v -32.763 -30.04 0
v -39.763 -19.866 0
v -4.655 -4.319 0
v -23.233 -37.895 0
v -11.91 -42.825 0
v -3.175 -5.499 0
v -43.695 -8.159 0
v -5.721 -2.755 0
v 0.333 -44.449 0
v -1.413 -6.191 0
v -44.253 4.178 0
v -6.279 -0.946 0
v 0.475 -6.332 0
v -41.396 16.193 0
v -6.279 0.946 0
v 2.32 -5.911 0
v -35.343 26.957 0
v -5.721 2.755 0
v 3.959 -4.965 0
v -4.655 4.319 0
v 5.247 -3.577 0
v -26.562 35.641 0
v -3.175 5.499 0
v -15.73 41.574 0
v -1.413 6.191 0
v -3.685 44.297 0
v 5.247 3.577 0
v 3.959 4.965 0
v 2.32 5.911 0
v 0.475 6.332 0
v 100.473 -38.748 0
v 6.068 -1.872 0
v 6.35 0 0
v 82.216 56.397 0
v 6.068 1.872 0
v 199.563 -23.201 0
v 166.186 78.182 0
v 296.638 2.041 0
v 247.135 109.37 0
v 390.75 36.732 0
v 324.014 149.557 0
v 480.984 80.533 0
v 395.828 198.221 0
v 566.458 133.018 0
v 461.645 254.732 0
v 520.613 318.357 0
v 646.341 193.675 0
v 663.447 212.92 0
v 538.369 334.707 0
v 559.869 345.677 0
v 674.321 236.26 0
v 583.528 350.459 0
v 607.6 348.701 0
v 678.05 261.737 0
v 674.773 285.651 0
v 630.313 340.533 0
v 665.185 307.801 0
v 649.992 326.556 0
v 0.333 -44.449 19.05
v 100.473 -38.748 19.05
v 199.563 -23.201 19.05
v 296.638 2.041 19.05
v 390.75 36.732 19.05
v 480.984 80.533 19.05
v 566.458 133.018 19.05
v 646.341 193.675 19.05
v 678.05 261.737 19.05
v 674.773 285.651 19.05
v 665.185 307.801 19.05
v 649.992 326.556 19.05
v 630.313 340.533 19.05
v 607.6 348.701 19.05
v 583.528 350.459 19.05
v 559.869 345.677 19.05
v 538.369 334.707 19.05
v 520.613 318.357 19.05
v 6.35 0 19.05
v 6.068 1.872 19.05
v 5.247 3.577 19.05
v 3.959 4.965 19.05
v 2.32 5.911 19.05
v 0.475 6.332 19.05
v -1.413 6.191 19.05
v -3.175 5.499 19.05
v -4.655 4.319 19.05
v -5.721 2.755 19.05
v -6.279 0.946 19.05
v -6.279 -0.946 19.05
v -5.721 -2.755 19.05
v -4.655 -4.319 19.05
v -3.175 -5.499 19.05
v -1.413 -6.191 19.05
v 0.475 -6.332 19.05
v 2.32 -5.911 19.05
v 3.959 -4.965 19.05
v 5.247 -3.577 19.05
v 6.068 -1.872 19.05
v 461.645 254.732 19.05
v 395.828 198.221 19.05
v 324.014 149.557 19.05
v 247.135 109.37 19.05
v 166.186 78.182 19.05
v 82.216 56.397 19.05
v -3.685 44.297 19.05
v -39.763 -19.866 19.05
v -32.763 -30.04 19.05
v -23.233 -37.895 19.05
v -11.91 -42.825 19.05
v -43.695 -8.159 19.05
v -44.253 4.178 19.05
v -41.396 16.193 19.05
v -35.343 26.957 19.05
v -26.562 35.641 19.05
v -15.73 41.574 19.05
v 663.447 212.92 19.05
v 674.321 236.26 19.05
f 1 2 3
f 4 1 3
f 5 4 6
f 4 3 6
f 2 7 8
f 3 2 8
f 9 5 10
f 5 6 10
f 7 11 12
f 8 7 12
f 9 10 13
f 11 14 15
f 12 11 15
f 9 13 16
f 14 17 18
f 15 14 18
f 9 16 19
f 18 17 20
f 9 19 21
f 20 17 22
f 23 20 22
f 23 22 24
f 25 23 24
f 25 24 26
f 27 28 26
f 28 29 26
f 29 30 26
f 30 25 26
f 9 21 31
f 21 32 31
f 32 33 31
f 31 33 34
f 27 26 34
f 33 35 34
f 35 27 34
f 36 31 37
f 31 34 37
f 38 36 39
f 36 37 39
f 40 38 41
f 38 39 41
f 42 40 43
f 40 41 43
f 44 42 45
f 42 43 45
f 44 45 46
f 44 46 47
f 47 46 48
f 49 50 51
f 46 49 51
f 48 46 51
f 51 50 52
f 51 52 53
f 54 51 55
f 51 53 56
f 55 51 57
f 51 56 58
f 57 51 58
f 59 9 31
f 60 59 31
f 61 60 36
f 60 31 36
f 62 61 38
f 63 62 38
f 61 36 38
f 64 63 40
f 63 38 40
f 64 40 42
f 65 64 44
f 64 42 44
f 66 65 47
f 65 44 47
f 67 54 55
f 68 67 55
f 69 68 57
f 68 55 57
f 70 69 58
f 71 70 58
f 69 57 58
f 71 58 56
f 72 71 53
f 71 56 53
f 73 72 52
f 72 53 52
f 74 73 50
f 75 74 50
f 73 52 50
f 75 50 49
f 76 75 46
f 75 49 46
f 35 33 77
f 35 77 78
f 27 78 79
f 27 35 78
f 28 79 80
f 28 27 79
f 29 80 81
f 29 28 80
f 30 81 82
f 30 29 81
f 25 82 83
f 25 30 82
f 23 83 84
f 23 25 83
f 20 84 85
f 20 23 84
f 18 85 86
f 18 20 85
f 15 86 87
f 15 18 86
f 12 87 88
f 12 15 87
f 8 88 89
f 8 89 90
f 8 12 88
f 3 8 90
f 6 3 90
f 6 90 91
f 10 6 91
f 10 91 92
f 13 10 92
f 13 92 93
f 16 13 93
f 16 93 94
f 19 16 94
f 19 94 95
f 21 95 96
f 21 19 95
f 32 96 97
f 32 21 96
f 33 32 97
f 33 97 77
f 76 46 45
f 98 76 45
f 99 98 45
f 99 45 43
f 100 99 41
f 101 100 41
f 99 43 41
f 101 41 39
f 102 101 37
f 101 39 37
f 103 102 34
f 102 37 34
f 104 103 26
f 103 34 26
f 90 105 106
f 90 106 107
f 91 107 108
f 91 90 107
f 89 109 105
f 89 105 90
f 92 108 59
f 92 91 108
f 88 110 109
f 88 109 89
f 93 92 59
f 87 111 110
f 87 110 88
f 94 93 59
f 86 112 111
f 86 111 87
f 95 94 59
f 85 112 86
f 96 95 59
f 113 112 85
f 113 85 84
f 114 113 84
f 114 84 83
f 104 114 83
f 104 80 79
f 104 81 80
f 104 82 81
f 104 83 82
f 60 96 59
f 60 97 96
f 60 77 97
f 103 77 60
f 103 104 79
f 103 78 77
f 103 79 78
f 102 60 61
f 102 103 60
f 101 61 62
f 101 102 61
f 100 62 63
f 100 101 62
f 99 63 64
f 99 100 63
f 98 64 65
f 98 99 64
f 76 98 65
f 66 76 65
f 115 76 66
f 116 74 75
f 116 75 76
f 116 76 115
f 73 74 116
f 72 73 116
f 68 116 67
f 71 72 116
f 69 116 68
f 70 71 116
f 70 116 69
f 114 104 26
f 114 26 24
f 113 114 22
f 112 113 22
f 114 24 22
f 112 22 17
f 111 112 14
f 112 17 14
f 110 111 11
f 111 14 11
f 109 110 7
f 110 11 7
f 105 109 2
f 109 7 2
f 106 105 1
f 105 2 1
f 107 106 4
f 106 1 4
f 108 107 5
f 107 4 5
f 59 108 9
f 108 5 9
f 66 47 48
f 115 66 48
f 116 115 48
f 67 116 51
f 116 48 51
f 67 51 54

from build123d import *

# Parameters (mm, degrees)
F0_R     = 6.35
F1_DEPTH = 19.05


with BuildPart() as f1:
    # F0 (on Top) → F1 (new body)
    with BuildSketch(Plane.XY):
        with BuildLine():
            ThreePointArc((0.332687, -44.448755), (31.5483, -31.313053), (44.45, 0))
            ThreePointArc((44.45, 0), (30.100022, 32.707663), (-3.684587, 44.297024))
            ThreePointArc((-3.684587, 44.297024), (-44.404528, -2.010069), (0.332687, -44.448755))
        make_face()
        Circle(F0_R, mode=Mode.SUBTRACT)
        with BuildLine():
            ThreePointArc((678.049984, 261.737104), (619.235303, 345.391653), (520.612783, 318.357437))
            ThreePointArc((520.612783, 318.357437), (526.551405, 198.613195), (646.341094, 193.675463))
            ThreePointArc((646.341094, 193.675463), (669.73379, 224.194326), (678.049984, 261.737104))
        make_face()
        with BuildLine():
            ThreePointArc((-3.684587, 44.297024), (30.100022, 32.707663), (44.45, 0))
            ThreePointArc((44.45, 0), (31.5483, -31.313053), (0.332687, -44.448755))
            ThreePointArc((0.332687, -44.448755), (344.122424, 18.224174), (646.341094, 193.675463))
            ThreePointArc((646.341094, 193.675463), (526.551405, 198.613195), (520.612783, 318.357437))
            ThreePointArc((520.612783, 318.357437), (286.146598, 128.368607), (-3.684587, 44.297024))
        make_face()
    extrude(amount=F1_DEPTH)


solid = f1.part
